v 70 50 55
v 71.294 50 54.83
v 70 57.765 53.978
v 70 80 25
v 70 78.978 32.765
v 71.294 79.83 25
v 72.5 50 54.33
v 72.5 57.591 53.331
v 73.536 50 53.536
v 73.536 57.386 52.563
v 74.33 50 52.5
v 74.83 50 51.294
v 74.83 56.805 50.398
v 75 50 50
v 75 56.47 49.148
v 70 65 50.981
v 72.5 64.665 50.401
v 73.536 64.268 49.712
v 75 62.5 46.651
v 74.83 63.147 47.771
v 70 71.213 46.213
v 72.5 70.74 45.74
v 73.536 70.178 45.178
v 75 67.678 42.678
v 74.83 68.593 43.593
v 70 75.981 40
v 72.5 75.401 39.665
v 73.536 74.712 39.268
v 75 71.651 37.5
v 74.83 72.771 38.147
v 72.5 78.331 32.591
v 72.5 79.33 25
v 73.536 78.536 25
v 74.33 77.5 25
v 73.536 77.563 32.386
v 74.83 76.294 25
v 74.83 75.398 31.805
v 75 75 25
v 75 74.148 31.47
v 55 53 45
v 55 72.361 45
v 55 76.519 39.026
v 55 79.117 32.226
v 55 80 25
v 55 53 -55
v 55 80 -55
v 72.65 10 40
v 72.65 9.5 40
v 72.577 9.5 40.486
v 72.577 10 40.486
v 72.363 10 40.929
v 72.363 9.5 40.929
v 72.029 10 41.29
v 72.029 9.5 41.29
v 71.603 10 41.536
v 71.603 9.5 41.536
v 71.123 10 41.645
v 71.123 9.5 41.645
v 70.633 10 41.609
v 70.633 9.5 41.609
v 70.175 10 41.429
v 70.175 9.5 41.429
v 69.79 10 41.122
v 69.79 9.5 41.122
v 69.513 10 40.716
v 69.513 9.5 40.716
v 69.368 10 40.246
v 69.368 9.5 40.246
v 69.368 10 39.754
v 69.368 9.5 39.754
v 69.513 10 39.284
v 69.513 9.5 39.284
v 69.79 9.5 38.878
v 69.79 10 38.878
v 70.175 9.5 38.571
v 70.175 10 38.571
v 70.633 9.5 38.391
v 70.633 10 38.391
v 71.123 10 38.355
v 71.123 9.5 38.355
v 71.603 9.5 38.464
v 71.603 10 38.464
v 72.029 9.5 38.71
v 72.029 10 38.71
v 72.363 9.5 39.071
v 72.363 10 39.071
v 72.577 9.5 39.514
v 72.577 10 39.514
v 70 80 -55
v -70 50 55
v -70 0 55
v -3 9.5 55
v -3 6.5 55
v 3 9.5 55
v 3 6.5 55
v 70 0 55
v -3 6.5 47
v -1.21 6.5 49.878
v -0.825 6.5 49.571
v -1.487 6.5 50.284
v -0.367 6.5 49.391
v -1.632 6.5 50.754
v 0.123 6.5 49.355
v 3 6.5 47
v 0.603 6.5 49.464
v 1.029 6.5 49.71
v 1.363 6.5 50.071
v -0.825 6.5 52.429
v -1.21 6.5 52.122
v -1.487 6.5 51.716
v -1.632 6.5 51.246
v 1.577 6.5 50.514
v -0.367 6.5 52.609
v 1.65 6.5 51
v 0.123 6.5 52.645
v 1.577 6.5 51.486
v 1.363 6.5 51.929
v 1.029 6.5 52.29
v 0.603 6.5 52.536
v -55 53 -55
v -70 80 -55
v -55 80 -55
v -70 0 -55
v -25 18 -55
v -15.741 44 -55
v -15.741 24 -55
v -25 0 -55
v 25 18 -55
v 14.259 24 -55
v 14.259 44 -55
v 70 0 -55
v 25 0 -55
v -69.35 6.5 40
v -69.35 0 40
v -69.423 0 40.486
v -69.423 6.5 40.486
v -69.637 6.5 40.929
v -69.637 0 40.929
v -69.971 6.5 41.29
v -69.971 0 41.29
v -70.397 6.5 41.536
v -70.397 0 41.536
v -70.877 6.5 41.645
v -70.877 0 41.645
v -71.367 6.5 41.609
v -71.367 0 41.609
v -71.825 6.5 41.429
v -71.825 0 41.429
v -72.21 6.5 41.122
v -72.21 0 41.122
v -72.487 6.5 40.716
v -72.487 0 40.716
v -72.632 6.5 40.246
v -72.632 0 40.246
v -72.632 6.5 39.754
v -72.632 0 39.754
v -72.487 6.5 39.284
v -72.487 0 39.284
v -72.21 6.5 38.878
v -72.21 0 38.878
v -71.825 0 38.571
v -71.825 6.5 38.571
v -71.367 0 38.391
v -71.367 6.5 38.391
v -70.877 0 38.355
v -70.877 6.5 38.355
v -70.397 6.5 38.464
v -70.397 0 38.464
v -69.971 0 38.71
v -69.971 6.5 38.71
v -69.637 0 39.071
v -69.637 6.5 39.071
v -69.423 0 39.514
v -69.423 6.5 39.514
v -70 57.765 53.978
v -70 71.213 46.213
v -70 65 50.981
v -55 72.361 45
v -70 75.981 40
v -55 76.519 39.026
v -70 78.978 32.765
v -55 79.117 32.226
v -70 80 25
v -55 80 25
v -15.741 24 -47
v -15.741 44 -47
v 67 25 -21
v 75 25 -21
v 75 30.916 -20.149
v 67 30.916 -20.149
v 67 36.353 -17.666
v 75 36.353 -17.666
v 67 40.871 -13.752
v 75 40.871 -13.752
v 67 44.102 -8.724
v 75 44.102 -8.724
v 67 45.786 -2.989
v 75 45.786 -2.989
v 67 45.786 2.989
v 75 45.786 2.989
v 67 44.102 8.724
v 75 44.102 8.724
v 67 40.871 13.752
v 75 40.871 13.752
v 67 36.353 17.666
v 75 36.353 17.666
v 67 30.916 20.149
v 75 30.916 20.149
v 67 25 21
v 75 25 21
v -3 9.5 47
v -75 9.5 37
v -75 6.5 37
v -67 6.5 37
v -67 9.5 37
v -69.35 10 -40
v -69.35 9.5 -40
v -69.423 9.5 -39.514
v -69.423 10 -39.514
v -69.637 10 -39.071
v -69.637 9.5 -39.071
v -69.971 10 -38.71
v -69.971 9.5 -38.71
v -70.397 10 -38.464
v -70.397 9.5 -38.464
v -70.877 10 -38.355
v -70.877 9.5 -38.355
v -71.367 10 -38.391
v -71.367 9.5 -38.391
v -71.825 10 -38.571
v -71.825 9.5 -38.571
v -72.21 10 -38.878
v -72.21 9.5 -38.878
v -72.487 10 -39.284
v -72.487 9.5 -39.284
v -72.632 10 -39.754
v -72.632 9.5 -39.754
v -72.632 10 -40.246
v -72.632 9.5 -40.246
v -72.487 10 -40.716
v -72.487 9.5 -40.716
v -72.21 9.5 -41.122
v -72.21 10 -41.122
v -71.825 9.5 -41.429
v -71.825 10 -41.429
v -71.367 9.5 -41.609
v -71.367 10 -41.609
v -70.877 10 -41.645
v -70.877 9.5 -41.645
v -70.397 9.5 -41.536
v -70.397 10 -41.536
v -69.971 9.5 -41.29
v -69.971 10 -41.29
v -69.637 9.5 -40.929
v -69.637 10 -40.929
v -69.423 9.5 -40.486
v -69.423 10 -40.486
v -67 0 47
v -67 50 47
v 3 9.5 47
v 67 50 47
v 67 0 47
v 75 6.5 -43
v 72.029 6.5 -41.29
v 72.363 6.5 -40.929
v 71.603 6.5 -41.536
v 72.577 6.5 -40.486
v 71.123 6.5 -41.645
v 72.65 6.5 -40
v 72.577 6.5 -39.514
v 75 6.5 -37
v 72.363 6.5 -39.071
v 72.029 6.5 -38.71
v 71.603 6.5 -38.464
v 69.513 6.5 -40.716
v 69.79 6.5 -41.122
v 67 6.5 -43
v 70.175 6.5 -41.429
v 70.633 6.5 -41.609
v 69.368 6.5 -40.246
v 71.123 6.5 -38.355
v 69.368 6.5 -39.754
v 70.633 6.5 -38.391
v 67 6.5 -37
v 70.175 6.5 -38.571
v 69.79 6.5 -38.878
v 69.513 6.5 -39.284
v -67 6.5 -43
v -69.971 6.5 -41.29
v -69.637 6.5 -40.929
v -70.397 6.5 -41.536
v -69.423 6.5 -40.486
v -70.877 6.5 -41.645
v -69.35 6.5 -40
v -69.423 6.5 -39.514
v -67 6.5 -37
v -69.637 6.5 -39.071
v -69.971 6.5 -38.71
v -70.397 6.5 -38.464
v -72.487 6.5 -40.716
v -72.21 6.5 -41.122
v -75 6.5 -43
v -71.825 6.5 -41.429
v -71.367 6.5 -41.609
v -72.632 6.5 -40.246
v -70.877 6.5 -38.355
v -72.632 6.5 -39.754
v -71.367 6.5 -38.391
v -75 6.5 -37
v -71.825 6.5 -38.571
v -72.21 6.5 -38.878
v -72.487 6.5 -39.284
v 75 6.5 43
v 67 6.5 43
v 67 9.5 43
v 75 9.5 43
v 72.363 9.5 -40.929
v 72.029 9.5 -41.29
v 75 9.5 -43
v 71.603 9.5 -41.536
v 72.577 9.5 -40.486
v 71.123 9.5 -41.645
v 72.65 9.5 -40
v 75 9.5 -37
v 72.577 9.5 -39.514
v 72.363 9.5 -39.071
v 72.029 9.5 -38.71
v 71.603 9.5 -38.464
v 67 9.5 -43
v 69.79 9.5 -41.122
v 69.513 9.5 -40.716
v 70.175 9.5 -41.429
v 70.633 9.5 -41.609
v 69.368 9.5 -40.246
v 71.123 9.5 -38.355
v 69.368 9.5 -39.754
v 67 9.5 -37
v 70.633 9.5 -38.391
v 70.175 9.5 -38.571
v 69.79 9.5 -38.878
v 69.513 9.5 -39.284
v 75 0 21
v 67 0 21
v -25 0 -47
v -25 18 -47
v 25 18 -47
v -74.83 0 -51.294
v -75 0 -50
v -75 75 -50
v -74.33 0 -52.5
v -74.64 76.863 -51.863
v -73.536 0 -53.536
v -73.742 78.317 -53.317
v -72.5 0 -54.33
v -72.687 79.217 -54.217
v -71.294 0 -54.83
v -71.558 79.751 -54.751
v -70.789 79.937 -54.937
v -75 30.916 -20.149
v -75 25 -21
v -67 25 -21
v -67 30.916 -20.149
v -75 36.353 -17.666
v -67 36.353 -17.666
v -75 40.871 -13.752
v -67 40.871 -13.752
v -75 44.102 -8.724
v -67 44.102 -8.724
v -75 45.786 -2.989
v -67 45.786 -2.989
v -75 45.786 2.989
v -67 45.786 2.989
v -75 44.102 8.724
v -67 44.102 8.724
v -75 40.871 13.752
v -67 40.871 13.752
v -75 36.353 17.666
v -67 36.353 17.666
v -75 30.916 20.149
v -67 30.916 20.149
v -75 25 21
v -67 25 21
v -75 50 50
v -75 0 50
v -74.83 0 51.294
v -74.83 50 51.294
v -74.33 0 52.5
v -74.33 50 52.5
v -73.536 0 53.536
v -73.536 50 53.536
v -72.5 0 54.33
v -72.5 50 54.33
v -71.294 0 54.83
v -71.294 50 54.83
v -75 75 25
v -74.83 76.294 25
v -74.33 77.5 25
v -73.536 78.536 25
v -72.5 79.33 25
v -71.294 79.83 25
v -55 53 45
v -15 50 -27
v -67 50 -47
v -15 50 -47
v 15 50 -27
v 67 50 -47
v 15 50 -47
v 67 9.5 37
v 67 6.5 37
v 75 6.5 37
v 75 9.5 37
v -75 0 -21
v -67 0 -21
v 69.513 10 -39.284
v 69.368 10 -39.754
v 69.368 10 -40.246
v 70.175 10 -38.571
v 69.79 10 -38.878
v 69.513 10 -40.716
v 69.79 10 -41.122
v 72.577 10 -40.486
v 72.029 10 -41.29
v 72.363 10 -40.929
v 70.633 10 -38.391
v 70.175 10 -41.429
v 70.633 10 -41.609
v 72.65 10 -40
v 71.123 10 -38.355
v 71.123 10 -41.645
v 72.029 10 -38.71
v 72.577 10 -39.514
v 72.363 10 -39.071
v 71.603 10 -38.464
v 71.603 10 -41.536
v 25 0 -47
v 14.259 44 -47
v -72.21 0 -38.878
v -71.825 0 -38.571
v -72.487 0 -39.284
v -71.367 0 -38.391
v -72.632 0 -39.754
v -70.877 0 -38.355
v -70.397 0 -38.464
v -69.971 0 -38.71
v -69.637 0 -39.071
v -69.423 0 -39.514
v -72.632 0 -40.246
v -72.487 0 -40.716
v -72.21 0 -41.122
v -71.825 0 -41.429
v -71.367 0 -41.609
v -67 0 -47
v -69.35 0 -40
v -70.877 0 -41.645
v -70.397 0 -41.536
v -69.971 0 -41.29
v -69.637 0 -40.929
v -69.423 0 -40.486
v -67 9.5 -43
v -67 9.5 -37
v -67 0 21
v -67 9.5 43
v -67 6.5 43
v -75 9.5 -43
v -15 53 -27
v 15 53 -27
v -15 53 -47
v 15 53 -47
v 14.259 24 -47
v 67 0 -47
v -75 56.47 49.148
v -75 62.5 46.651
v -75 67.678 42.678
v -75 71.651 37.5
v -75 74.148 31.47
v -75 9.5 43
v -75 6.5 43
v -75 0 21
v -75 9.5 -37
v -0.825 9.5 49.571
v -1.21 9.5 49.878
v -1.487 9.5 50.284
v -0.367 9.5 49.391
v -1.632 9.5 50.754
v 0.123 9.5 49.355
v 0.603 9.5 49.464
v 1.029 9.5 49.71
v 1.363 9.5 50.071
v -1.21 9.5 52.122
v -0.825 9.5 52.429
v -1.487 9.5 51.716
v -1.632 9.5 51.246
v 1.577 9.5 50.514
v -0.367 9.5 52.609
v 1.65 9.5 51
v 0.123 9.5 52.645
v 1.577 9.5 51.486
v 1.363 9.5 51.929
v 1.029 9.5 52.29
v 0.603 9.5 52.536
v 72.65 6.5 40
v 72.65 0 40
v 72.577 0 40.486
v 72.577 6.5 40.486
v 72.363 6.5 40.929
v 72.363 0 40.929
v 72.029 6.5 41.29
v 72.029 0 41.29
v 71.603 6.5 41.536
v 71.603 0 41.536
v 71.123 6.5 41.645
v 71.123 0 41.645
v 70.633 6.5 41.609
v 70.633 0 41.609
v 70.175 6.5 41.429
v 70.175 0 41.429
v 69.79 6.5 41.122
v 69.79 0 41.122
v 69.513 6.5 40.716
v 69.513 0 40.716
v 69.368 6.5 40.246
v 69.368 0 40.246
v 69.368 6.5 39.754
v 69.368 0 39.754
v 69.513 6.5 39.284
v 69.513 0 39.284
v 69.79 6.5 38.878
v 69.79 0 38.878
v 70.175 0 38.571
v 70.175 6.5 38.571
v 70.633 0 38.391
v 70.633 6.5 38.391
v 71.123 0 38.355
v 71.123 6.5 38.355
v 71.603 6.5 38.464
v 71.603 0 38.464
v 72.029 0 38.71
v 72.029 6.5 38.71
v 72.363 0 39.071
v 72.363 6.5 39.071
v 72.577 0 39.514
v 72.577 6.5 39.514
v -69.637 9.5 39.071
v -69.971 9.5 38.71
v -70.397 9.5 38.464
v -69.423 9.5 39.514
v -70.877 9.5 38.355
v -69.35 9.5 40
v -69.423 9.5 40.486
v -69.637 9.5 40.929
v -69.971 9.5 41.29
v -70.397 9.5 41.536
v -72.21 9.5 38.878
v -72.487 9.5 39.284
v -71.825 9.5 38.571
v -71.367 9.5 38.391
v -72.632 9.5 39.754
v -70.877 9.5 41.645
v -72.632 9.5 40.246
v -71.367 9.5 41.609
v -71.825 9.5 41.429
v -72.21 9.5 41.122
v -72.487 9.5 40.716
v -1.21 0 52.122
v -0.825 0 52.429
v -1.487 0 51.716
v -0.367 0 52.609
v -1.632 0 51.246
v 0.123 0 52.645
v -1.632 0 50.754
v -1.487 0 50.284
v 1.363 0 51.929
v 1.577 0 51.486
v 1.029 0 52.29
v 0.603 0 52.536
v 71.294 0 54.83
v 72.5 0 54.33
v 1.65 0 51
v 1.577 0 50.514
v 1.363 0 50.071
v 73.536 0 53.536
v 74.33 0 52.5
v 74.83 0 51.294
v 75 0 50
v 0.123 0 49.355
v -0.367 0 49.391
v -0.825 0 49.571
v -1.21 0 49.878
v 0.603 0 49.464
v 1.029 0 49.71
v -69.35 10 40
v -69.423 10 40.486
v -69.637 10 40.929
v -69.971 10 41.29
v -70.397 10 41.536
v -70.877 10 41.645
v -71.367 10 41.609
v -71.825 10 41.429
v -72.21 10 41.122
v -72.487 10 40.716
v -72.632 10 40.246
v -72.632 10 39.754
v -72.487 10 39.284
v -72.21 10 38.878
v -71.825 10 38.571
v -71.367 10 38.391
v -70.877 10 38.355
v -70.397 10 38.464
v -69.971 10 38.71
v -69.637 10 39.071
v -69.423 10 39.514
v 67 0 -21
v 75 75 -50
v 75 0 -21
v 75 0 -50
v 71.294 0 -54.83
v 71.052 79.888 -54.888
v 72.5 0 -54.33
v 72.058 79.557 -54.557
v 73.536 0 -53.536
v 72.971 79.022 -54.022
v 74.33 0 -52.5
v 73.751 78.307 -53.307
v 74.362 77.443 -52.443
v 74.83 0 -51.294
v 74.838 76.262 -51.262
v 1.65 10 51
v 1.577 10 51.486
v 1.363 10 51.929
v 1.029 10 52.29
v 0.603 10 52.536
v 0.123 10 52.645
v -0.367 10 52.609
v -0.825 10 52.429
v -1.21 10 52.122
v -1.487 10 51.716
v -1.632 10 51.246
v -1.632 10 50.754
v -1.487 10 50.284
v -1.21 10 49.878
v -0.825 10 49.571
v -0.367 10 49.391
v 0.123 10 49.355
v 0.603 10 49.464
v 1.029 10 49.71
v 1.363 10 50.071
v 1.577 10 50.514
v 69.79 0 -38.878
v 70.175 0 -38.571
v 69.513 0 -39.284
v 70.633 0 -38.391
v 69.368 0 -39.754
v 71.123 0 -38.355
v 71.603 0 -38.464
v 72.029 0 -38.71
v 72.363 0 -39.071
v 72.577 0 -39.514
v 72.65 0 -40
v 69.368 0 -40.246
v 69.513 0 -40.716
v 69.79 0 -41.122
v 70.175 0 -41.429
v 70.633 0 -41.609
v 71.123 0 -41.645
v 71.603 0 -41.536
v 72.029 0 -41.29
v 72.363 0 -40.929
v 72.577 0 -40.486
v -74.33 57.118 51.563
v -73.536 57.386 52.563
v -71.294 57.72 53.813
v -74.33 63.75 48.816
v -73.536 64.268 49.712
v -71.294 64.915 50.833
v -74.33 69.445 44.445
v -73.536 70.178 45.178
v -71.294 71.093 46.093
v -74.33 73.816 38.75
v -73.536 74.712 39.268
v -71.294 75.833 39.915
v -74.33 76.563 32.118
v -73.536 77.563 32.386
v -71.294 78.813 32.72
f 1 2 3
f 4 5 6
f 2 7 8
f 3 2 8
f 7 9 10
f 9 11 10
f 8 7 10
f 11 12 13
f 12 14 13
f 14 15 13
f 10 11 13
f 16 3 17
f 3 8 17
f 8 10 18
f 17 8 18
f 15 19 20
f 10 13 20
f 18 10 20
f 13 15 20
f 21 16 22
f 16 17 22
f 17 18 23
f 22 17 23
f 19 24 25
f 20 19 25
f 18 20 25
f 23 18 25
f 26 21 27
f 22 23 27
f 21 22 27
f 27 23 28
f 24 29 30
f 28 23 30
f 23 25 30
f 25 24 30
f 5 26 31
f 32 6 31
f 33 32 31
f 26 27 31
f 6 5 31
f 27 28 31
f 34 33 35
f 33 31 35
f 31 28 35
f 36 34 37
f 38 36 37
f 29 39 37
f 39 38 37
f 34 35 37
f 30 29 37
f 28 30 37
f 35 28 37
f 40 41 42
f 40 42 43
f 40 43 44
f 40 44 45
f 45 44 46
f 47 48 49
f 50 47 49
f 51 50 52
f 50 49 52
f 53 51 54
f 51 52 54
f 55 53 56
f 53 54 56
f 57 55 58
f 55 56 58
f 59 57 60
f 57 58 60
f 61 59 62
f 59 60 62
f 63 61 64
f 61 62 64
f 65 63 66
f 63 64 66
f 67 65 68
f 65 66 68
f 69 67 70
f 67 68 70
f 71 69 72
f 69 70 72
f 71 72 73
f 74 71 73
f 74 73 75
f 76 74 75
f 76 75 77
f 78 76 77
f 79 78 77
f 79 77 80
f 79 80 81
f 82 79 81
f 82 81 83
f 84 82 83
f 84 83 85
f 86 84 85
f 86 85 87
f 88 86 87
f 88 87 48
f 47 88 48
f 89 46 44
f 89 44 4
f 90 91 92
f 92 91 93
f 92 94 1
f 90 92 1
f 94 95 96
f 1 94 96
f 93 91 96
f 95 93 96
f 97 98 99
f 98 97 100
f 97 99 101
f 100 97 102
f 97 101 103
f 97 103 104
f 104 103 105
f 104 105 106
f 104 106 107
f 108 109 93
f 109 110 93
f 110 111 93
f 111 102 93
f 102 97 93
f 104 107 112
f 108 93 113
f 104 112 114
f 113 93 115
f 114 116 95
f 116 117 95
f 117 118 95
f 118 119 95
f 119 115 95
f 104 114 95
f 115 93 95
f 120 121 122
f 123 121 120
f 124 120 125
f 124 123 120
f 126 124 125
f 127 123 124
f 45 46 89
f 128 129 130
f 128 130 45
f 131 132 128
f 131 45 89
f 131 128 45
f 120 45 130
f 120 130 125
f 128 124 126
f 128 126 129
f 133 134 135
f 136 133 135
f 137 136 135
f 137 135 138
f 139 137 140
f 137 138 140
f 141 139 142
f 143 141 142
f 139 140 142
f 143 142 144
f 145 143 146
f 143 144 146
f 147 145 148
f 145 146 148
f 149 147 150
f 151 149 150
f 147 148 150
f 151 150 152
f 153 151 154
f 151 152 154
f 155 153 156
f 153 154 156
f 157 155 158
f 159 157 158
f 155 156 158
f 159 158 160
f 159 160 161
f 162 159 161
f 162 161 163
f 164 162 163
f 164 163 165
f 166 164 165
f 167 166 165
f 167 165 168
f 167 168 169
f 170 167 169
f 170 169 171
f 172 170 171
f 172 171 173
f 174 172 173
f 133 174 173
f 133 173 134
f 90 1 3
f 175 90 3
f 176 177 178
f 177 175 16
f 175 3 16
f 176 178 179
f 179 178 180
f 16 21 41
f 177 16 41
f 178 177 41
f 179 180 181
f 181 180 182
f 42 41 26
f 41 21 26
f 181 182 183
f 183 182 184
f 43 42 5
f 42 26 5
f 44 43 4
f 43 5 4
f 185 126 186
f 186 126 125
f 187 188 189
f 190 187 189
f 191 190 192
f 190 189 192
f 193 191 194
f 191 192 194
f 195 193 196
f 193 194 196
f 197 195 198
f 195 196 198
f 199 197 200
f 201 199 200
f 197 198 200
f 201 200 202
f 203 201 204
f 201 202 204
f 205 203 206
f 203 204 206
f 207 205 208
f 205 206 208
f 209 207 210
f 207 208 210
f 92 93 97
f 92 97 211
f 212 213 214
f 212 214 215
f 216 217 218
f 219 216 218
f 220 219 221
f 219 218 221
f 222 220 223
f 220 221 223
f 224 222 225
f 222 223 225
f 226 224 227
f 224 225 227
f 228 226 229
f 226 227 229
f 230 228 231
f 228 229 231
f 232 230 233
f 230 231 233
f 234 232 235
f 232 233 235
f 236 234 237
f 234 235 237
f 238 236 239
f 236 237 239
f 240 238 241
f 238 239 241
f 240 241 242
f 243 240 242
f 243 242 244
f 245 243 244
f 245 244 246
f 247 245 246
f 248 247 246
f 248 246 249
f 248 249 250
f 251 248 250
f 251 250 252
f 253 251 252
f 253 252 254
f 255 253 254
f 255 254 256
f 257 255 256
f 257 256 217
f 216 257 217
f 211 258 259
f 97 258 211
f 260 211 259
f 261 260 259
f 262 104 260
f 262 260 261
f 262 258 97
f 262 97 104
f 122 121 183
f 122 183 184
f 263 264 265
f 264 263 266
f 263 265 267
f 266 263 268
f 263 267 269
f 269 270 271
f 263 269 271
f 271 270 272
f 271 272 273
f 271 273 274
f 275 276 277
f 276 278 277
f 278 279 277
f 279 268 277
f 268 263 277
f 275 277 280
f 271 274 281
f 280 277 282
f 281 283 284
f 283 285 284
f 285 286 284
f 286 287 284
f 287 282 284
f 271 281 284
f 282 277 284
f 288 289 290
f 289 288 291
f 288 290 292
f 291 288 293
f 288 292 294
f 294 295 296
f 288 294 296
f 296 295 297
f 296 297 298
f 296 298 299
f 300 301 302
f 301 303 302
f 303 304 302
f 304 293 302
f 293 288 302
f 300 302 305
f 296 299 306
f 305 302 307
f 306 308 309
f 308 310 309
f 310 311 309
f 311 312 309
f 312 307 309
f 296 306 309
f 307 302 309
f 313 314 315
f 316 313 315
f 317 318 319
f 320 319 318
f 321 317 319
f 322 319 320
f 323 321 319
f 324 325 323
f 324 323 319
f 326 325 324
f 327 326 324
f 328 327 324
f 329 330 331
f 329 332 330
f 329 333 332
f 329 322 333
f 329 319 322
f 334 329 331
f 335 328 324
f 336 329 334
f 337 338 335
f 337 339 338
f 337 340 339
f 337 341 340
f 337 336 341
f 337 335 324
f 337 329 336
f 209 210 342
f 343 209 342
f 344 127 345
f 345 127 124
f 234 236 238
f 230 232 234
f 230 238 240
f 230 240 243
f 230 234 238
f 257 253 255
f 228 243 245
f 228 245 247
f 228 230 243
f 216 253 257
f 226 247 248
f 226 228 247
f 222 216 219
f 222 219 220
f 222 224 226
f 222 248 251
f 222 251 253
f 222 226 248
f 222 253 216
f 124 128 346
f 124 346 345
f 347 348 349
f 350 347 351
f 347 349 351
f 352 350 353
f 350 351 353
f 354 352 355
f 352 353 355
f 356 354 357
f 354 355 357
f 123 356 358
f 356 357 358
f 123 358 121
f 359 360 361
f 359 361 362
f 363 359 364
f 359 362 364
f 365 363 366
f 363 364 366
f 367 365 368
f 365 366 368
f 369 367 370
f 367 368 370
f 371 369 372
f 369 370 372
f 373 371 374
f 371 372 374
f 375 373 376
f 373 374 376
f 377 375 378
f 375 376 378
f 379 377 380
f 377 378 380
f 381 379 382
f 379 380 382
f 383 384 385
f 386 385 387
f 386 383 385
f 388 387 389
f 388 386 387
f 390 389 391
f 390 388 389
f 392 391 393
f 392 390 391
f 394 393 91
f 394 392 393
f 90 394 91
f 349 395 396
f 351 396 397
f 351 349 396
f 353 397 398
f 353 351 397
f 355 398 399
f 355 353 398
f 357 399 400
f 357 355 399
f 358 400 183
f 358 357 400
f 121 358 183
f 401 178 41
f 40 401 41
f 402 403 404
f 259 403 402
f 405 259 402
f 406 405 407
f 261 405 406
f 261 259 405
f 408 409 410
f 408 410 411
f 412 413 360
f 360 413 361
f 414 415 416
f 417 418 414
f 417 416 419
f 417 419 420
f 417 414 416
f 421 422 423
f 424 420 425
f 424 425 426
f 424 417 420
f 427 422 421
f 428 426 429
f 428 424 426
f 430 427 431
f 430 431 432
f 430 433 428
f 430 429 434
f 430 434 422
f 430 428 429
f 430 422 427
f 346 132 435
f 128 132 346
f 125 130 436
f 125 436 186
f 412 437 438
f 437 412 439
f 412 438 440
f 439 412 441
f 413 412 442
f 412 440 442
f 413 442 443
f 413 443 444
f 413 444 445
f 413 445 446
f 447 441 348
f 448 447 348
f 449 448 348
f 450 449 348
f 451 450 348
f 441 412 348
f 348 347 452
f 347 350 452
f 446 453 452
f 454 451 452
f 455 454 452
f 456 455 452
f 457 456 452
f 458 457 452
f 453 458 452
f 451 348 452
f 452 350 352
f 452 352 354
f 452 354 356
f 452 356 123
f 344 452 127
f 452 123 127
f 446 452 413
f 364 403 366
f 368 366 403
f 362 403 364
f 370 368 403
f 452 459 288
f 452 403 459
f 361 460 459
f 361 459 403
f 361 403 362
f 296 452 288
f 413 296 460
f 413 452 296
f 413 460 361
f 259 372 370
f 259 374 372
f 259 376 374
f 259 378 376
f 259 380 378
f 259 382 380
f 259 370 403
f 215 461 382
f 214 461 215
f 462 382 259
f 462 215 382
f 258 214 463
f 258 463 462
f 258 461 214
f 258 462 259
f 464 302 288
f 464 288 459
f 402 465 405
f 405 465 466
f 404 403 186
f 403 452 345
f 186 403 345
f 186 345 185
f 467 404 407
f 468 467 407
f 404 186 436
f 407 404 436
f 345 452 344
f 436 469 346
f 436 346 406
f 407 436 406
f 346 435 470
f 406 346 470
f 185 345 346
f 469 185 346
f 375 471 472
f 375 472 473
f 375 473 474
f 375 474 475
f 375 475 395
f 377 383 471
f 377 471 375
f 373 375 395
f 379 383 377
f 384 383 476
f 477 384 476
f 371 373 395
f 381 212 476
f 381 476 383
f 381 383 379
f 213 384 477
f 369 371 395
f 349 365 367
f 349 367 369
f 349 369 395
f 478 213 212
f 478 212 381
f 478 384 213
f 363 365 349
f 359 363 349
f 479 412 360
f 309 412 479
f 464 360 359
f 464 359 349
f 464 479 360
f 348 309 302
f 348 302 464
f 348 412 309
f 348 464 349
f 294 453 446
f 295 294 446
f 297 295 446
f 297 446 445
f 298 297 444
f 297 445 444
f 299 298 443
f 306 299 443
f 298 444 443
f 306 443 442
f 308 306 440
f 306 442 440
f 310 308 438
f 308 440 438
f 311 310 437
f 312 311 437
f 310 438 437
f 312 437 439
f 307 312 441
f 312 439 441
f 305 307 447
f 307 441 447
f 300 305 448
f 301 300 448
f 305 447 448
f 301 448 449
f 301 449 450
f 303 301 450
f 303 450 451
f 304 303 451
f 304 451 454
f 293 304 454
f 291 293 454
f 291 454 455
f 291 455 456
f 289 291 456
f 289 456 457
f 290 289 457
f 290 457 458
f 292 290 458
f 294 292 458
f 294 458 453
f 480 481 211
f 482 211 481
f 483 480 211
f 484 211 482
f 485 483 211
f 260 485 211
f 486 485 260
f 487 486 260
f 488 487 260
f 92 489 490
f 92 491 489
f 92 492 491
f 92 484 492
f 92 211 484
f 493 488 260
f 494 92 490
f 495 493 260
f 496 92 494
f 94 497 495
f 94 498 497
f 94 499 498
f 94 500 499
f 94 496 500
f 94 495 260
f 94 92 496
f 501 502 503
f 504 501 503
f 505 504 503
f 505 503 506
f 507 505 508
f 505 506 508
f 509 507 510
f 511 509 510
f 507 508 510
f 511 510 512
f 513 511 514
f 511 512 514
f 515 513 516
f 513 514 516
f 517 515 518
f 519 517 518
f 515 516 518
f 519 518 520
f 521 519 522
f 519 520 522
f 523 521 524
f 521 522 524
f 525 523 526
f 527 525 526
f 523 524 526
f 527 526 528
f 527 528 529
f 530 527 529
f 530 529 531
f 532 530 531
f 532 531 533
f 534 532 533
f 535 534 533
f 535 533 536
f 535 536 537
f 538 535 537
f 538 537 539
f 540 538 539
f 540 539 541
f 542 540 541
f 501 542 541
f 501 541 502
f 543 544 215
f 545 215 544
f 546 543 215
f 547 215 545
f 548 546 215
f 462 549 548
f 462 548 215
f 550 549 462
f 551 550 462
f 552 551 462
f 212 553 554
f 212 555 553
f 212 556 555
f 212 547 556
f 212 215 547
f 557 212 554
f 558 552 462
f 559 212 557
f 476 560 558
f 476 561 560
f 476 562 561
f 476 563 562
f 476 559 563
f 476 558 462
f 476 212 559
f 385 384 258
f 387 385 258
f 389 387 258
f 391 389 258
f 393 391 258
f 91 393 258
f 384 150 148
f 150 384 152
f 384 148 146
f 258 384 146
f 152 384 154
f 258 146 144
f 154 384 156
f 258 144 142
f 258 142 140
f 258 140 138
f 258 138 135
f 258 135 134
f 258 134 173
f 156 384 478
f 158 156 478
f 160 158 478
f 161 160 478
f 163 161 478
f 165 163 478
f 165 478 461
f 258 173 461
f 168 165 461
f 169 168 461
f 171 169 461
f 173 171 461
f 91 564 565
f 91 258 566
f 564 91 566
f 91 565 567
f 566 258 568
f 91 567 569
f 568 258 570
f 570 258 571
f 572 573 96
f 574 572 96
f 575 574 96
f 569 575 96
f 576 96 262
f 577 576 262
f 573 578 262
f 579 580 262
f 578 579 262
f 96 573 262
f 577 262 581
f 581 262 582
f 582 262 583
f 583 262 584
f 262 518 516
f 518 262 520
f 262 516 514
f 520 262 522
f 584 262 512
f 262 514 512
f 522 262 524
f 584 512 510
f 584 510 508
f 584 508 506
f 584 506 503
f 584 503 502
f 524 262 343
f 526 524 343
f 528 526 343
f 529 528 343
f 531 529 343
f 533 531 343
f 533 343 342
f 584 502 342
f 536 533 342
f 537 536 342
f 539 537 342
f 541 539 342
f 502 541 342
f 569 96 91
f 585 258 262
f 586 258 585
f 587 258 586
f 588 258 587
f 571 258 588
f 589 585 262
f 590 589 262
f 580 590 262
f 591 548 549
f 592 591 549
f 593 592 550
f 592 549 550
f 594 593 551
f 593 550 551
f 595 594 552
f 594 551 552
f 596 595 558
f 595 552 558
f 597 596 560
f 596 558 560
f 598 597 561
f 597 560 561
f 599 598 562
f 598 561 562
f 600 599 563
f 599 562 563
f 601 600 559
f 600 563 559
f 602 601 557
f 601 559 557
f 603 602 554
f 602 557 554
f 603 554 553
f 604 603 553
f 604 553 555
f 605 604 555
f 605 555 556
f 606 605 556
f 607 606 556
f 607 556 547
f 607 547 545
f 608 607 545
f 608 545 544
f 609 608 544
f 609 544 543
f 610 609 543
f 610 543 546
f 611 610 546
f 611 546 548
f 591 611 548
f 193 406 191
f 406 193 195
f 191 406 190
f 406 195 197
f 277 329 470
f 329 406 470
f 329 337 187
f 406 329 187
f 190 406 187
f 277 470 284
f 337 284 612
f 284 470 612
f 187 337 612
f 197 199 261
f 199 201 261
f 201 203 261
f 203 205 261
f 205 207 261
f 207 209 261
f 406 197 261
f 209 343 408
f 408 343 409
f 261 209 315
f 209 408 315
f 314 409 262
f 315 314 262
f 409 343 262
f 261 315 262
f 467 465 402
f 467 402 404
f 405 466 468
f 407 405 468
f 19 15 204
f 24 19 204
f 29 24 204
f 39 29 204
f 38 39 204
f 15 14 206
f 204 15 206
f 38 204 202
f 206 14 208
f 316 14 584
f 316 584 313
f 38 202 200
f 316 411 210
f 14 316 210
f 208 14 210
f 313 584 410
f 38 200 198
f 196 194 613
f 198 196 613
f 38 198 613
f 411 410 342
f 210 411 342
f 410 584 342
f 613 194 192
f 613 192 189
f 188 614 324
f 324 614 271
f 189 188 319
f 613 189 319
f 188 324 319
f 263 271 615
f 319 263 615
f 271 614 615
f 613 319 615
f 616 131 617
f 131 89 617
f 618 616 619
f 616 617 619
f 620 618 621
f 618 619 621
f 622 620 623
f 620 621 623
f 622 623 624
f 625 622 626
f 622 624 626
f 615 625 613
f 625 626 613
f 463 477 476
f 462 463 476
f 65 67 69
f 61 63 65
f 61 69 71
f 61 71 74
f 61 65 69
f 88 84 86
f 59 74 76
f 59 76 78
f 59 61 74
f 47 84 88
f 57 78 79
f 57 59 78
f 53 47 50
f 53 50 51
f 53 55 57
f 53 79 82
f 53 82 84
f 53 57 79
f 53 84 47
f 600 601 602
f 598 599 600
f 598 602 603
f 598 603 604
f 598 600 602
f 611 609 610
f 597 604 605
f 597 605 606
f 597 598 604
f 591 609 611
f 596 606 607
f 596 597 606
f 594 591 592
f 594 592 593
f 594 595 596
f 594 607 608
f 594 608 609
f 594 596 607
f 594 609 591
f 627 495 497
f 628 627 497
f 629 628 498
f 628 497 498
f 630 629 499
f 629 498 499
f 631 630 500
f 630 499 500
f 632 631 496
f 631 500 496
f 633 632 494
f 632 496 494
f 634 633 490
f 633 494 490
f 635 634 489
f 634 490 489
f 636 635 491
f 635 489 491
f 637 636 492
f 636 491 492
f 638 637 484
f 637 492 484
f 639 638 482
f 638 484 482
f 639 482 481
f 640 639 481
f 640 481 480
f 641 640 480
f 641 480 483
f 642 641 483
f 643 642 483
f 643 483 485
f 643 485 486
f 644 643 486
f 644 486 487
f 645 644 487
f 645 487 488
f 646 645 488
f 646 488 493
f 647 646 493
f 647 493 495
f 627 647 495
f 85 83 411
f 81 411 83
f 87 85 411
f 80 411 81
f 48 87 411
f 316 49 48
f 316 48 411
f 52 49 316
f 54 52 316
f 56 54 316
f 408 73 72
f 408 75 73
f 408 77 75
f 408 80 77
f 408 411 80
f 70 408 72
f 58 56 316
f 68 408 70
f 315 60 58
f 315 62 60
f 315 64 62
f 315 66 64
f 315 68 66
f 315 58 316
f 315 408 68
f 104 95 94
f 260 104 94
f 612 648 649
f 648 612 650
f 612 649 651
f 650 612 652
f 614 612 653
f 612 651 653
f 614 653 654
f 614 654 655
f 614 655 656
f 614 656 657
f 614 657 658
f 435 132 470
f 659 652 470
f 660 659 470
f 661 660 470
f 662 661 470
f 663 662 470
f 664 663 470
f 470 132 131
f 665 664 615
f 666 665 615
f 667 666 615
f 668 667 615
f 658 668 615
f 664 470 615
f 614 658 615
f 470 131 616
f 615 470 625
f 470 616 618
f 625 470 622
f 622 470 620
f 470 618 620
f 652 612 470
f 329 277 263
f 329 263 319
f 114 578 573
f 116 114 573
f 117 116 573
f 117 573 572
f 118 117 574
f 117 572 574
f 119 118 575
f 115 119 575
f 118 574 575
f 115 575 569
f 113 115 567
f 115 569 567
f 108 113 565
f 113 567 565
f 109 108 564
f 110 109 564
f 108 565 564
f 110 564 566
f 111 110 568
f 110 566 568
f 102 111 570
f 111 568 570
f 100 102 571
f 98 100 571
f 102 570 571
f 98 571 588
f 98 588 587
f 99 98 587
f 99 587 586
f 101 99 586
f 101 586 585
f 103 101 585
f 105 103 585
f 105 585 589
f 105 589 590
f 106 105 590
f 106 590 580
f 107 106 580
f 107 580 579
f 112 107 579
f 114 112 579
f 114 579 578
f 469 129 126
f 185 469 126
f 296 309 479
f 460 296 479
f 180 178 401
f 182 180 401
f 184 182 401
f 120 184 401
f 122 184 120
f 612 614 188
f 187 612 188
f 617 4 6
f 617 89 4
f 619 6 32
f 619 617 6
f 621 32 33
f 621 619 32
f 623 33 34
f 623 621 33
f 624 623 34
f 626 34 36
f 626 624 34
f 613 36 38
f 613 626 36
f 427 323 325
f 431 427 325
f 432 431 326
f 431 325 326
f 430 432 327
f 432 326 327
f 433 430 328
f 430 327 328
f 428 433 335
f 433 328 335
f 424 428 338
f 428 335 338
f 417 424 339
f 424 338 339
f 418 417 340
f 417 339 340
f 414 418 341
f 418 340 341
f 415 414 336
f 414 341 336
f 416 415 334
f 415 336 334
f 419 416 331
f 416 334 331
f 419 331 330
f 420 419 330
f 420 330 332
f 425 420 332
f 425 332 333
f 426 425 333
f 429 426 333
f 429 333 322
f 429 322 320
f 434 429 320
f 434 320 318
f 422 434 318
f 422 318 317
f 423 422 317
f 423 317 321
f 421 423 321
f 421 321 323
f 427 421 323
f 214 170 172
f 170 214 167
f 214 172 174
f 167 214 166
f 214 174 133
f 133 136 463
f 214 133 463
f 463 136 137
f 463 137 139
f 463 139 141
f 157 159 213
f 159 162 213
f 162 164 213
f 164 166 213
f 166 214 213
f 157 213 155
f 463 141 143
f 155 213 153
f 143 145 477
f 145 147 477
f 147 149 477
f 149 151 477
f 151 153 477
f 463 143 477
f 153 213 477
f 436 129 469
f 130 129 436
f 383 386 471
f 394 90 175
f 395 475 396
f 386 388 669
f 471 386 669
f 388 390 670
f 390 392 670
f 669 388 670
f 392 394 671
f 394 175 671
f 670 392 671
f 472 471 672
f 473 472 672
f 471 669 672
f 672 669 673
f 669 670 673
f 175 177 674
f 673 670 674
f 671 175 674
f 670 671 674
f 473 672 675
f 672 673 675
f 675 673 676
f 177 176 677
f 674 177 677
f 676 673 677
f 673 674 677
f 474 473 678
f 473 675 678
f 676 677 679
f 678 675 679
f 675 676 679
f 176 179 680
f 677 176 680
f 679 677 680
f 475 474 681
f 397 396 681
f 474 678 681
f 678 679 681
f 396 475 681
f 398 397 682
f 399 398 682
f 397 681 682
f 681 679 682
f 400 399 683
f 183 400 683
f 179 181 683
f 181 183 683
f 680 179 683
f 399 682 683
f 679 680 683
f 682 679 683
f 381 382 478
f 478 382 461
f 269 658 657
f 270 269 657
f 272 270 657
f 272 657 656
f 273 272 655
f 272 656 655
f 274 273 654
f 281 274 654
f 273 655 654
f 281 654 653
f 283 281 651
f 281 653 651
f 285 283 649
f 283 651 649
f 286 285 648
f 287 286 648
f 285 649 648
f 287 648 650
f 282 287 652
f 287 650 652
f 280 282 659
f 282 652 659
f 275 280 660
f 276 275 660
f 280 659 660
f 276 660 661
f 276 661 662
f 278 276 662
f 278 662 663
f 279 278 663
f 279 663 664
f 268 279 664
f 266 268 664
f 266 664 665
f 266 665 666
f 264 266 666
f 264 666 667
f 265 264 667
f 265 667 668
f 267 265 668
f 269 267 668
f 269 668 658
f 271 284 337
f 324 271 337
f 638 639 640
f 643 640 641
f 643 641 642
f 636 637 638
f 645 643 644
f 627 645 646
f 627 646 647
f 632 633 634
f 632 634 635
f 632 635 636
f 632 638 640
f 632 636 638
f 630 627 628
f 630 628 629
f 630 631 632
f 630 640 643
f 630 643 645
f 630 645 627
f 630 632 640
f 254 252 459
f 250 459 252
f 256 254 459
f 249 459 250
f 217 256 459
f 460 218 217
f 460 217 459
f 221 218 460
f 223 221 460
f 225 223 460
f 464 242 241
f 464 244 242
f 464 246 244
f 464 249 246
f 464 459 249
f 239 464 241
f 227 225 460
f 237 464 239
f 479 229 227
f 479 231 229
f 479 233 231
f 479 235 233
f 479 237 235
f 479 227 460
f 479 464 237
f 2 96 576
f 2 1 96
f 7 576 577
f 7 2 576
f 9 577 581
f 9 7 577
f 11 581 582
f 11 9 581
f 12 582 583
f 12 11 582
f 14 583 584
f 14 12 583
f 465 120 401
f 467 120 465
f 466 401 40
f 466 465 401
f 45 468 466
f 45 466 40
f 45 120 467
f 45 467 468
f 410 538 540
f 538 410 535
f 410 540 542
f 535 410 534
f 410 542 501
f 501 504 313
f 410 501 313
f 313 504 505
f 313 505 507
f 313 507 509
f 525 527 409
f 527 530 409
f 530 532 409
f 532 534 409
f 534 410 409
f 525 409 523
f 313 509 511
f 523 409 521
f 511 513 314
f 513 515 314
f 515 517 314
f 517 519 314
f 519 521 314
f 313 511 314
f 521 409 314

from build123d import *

# Parameters (mm, degrees)
SKETCH_1_W          = 150
SKETCH_1_H          = 110
EXTRUDE_1_DEPTH     = 80
FILLET_3_R          = 30
FILLET_1_R          = 5
CUT_EXTRUDE_1_DEPTH = 151
SKETCH_3_W          = 50
SKETCH_3_H          = 18
CUT_EXTRUDE_2_DEPTH = 50
SKETCH_4_W          = 134
SKETCH_4_H          = 94
CUT_EXTRUDE_3_DEPTH = 50
SKETCH_5_W          = 110
SKETCH_5_H          = 100
CUT_EXTRUDE_4_DEPTH = 27
SKETCH_6_W          = 30
SKETCH_6_H          = 20
CUT_EXTRUDE_5_DEPTH = 23.3
SKETCH_7_W          = 30
SKETCH_7_H          = 20
CUT_EXTRUDE_6_DEPTH = 23.3
SKETCH_8_R          = 1.65
CUT_EXTRUDE_7_DEPTH = 10
SKETCH_11_W         = 6
SKETCH_11_H         = 3
CUT_EXTRUDE_8_DEPTH = 161
SKETCH_12_W         = 6
SKETCH_12_H         = 3
CUT_EXTRUDE_9_DEPTH = 161


with BuildPart() as part:
    # 草图1 → 凸台-拉伸1 (new body)
    with BuildSketch(Plane(origin=(0, 0, 0), x_dir=(1, 0, 0), z_dir=(0, 1, 0))):
        Rectangle(SKETCH_1_W, SKETCH_1_H)
    extrude(amount=EXTRUDE_1_DEPTH)

    # 圆角3
    fillet_3_edges = [part.edges().sort_by_distance(p)[0] for p in [
        (0, 80, 55),
    ]]
    fillet(fillet_3_edges, radius=FILLET_3_R)

    # 圆角1
    fillet_1_edges = [part.edges().sort_by_distance(p)[0] for p in [
        (-75, 80, -15),
        (75, 80, -15),
        (75, 25, 55),
        (75, 71.213203436, 46.213203436),
        (-75, 25, 55),
        (-75, 71.213203436, 46.213203436),
        (-75, 40, -55),
        (75, 40, -55),
    ]]
    fillet(fillet_1_edges, radius=FILLET_1_R)

    # 草图2 → 切除-拉伸1 (cut, through all)
    with BuildSketch(Plane(origin=(75, 0, 0), x_dir=(0, 0, -1), z_dir=(1, 0, 0))):
        with BuildLine():
            Line((-21, 25), (-21, 0))
            Line((-21, 0), (21, 0))
            Line((21, 0), (21, 25))
            ThreePointArc((21, 25), (0, 46), (-21, 25))
        make_face()
    extrude(amount=-CUT_EXTRUDE_1_DEPTH, mode=Mode.SUBTRACT)

    # 草图3 → 切除-拉伸2 (cut)
    with BuildSketch(Plane(origin=(0, 0, -55), x_dir=(-1, 0, 0), z_dir=(0, 0, -1))):
        with Locations((0, 9)):
            Rectangle(SKETCH_3_W, SKETCH_3_H)
    extrude(amount=-CUT_EXTRUDE_2_DEPTH, mode=Mode.SUBTRACT)

    # 草图4 → 切除-拉伸3 (cut)
    with BuildSketch(Plane.XZ):
        Rectangle(SKETCH_4_W, SKETCH_4_H)
    extrude(amount=-CUT_EXTRUDE_3_DEPTH, mode=Mode.SUBTRACT)

    # 草图5 → 切除-拉伸4 (cut)
    with BuildSketch(Plane(origin=(0, 80, 0), x_dir=(1, 0, 0), z_dir=(0, 1, 0))):
        with Locations((0, 5)):
            Rectangle(SKETCH_5_W, SKETCH_5_H)
    extrude(amount=-CUT_EXTRUDE_4_DEPTH, mode=Mode.SUBTRACT)

    # 草图6 → 切除-拉伸5 (cut)
    with BuildSketch(Plane(origin=(0, 0, -55), x_dir=(-1, 0, 0), z_dir=(0, 0, -1))):
        with Locations((0.741149686, 34)):
            Rectangle(SKETCH_6_W, SKETCH_6_H)
    extrude(amount=-CUT_EXTRUDE_5_DEPTH, mode=Mode.SUBTRACT)

    # 草图7 → 切除-拉伸6 (cut)
    with BuildSketch(Plane(origin=(0, 53, 0), x_dir=(1, 0, 0), z_dir=(0, 1, 0))):
        with Locations((0, 37)):
            Rectangle(SKETCH_7_W, SKETCH_7_H)
    extrude(amount=-CUT_EXTRUDE_6_DEPTH, mode=Mode.SUBTRACT)

    # 草图8 → 切除-拉伸7 (cut)
    with BuildSketch(Plane.XZ):
        with Locations((71, 40)):
            Circle(SKETCH_8_R)
        with Locations((71, -40)):
            Circle(SKETCH_8_R)
        with Locations((-71, -40)):
            Circle(SKETCH_8_R)
        with Locations((-71, 40)):
            Circle(SKETCH_8_R)
        with Locations((0, 51)):
            Circle(SKETCH_8_R)
    extrude(amount=-CUT_EXTRUDE_7_DEPTH, mode=Mode.SUBTRACT)

    # 草图11 → 切除-拉伸8 (cut)
    with BuildSketch(Plane.ZY.offset(75)):
        with Locations((-40, 8)):
            Rectangle(SKETCH_11_W, SKETCH_11_H)
        with Locations((40, 8)):
            Rectangle(SKETCH_11_W, SKETCH_11_H)
    extrude(amount=-CUT_EXTRUDE_8_DEPTH, mode=Mode.SUBTRACT)

    # 草图12 → 切除-拉伸9 (cut)
    with BuildSketch(Plane.XY.offset(55)):
        with Locations((0, 8)):
            Rectangle(SKETCH_12_W, SKETCH_12_H)
    extrude(amount=-CUT_EXTRUDE_9_DEPTH, mode=Mode.SUBTRACT)


solid = part.part
